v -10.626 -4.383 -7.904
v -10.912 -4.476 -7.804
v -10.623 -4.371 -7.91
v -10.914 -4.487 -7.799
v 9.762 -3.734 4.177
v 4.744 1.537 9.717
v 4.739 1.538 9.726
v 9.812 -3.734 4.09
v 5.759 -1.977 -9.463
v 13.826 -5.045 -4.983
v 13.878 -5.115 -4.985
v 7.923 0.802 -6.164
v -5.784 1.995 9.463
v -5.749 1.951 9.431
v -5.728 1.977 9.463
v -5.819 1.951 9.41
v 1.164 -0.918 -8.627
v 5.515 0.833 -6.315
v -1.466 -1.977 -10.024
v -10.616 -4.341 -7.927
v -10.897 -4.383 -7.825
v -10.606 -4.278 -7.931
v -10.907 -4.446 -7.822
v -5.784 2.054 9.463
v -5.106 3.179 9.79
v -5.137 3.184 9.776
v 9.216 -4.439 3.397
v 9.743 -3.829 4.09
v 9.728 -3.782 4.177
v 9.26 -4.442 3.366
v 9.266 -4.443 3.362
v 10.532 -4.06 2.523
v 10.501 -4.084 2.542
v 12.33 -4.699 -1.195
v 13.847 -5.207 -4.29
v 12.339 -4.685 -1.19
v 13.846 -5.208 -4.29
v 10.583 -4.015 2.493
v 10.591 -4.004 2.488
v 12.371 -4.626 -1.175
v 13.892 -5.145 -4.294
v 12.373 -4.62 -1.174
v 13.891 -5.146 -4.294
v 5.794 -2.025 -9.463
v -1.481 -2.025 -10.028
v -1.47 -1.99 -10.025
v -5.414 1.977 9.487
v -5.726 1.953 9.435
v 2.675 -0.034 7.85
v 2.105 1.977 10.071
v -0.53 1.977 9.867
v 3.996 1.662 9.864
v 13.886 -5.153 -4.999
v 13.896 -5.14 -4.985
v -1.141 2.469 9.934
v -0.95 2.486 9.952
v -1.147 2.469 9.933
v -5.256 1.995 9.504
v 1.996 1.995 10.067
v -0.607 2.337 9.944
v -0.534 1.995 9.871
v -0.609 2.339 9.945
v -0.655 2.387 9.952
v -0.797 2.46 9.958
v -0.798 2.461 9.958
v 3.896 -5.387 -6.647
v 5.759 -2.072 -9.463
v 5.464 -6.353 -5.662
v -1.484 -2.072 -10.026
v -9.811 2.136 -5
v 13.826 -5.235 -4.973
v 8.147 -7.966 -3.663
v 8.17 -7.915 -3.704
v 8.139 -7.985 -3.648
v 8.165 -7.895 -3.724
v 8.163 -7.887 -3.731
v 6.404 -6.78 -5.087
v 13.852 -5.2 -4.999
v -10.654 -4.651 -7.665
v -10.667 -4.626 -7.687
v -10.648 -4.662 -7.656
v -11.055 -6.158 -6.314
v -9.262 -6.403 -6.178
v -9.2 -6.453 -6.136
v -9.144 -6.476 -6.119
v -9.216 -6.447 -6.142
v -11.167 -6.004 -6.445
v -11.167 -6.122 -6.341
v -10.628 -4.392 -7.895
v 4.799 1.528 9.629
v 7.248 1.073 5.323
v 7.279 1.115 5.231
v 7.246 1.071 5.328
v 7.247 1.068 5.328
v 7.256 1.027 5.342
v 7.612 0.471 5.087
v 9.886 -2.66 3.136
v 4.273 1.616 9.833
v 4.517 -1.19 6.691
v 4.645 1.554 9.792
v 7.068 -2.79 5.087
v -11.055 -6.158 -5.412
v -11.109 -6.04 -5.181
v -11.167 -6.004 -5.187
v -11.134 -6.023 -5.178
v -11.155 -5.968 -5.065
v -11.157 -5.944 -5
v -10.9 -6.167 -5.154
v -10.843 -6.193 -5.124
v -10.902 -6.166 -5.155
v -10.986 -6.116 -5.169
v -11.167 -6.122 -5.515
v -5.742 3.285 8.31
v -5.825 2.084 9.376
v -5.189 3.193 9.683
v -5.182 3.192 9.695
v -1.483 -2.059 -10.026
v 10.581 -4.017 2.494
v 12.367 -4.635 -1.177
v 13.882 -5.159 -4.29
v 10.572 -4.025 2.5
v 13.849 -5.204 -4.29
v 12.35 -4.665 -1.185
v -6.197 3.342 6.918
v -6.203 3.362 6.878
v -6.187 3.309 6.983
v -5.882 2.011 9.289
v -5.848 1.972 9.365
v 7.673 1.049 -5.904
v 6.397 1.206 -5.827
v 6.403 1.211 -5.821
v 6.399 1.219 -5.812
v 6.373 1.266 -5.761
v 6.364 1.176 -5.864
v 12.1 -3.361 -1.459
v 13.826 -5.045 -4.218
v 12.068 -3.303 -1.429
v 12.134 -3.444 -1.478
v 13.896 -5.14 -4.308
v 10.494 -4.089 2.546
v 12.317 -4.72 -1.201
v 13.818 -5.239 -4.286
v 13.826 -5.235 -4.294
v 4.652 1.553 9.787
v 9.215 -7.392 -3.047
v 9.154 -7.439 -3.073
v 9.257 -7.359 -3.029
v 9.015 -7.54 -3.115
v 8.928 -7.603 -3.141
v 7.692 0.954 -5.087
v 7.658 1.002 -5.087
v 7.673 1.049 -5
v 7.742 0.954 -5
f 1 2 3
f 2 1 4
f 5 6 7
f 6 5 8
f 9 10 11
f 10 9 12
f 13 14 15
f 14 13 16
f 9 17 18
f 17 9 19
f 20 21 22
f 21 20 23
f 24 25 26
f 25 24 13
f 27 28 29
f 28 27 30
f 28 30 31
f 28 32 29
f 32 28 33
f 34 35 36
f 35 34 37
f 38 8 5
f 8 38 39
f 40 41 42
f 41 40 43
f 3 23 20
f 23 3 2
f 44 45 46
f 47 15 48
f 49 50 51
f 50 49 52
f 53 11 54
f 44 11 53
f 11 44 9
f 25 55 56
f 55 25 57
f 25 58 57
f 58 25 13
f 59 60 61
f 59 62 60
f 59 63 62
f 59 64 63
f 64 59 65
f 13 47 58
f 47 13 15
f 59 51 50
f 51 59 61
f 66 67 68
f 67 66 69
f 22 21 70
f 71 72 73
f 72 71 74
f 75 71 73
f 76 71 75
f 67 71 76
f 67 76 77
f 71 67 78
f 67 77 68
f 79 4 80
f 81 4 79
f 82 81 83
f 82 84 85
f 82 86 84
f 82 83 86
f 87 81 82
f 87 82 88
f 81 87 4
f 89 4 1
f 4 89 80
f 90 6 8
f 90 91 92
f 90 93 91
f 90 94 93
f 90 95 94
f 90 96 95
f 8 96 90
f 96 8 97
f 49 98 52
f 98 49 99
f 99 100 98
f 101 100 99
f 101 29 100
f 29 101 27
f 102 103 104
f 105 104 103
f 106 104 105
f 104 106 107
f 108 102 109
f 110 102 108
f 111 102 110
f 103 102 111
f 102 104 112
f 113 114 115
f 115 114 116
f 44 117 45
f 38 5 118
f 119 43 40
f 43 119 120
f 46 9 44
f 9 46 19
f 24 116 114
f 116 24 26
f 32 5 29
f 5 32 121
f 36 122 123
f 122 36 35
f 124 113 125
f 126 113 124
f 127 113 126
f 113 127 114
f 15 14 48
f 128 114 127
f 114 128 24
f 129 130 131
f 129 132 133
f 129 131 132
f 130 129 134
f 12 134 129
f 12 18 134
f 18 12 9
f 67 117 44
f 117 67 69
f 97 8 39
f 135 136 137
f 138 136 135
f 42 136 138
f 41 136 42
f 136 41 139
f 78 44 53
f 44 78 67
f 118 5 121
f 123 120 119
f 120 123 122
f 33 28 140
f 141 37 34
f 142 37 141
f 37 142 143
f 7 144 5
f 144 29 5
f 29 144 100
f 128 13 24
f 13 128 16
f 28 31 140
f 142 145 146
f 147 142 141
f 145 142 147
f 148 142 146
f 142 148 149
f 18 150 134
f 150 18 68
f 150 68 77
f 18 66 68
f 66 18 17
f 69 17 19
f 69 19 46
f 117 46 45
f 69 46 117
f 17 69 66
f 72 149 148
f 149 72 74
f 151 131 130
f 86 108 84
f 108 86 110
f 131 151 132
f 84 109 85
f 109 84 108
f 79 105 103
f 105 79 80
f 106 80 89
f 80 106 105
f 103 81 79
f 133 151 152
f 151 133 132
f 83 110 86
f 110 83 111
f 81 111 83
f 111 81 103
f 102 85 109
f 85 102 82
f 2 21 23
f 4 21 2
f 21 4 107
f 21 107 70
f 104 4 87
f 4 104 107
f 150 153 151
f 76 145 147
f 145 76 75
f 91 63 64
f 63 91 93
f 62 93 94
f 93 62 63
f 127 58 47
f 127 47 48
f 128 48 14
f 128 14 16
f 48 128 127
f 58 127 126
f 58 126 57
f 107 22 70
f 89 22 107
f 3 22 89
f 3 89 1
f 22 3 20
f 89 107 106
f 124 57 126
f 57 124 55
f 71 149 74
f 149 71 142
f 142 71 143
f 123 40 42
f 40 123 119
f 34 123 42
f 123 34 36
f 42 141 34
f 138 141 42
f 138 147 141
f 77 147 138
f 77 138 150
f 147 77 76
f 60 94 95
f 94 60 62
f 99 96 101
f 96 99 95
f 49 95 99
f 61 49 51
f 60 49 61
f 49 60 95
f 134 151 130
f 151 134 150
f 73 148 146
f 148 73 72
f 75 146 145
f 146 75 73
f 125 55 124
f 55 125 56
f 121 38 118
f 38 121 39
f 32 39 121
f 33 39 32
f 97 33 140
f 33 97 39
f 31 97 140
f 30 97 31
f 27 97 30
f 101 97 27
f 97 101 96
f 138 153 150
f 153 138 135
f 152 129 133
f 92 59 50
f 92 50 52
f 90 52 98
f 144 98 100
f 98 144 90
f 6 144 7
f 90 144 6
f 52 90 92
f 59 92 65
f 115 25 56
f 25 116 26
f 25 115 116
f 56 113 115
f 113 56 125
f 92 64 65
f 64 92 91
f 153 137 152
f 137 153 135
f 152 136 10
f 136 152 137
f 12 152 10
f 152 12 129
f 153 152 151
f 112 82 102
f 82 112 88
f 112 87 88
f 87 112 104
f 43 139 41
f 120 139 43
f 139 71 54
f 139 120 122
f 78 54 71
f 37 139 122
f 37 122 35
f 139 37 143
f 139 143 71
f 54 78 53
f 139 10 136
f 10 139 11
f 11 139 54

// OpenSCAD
// Auto-generated OpenSCAD file

    inner_points = 10*[[0.599886064142325, -0.8909680205958462, -0.5000000000000165], [0.7642449049774599, 0.095432593474994, -0.500000000000021], [-1.1086099160454883, -0.6062901575962651, 0.500000000000021], [-0.9442510752103533, 0.3801104564745751, 0.5000000000000165], [0.599886064142347, -0.8909680205958453, 0.4999999999999834], [0.764244904977482, 0.09543259347499483, 0.49999999999997896], [-0.2543619259516038, -0.7486290890960565, -0.9999999999999978], [-0.09000308511646875, 0.23777152497478365, -1.0000000000000022], [-0.2543619259515596, -0.7486290890960547, 1.0000000000000022], [-0.09000308511642456, 0.23777152497478538, 0.9999999999999978], [-1.1086099160455103, -0.606290157596266, -0.49999999999997896], [-0.9442510752103753, 0.3801104564745742, -0.4999999999999834], [1.3795560477359692, -0.51398696446291, -3.397282455352979e-14], [-0.9480517821689757, -0.12614969085949718, 1.3623724356958116], [-0.948051782169036, -0.12614969085949948, -1.3623724356957776]];

    outer_points = 10*[[-1.0227603980993214, -0.3734255004598836, 0.25399717259450516], [-0.9712245325180885, 0.3734255004598836, -0.40899425795639943], [0.9712245325180885, -0.3734255004598836, 0.40899425795639943], [1.0227603980993214, 0.3734255004598836, -0.25399717259450516], [-0.47413873270521345, -0.9493249594098434, -0.3521002465068624], [-0.4226028671239805, -0.20247395849007616, -1.0150916770577671], [-0.5743895981847245, 0.20247395849007616, 0.9375931343768199], [-0.5228537326034916, 0.9493249594098434, 0.27460170382591526], [0.5228537326034916, -0.9493249594098434, -0.27460170382591526], [0.5743895981847245, -0.20247395849007616, -0.9375931343768199], [0.4226028671239805, 0.20247395849007616, 1.0150916770577671], [0.47413873270521345, 0.9493249594098434, 0.3521002465068624], [-1.312748714738331, -0.5230596990703646, -0.6912627825601987], [1.4038013919276195, -0.5230596990703646, -0.4800990258499658], [-0.09105267718928864, 1.0461193981407293, 1.1713618084101645]];

    // Convex hull for inner set (I)
    module inner_hull() {
        hull() {
            for (p = inner_points) {
                translate(p) sphere(r=0.1);
            }
        }
    }

    // Convex hull for outer set (O) minus inner hull (O \ I)
    module outer_minus_inner() {
        difference() {
            hull() {
                for (p = outer_points) {
                    translate(p) sphere(r=0.1);
                }
            }
            inner_hull(); // Subtract inner hull
        }
    }

    // Convex hull for outer set (O) minus all translated inner hulls
    module outer_minus_AllTranslationInner() {
        difference() {
            hull() {
                for (p = outer_points) {
                    translate(p) sphere(r=0.1);
                }
            }
            hull() {
                translate([0,0,50]) inner_hull();
                translate([0,0,-50]) inner_hull();
            }; // Subtract translated inner hulls
        }
    }

    // Difference between outer_minus_inner and outer_minus_AllTranslationInner
    module outer_minus_inner_diff() {
        difference() {
            // Outer minus inner
            difference() {
                hull() {
                    for (p = outer_points) {
                        translate(p) sphere(r=0.1);
                    }
                }
                inner_hull();
            }

            // Subtract Outer minus AllTranslationInner
            difference() {
                hull() {
                    for (p = outer_points) {
                        translate(p) sphere(r=0.1);
                    }
                }
                hull() {
                    translate([0,0,50]) inner_hull();
                    translate([0,0,-50]) inner_hull();
                };
            }
        }
    }

    // Rendering all with colors applied
    color([1, 1, 0, 1]) outer_minus_inner_diff(); // Opaque yellow
    
